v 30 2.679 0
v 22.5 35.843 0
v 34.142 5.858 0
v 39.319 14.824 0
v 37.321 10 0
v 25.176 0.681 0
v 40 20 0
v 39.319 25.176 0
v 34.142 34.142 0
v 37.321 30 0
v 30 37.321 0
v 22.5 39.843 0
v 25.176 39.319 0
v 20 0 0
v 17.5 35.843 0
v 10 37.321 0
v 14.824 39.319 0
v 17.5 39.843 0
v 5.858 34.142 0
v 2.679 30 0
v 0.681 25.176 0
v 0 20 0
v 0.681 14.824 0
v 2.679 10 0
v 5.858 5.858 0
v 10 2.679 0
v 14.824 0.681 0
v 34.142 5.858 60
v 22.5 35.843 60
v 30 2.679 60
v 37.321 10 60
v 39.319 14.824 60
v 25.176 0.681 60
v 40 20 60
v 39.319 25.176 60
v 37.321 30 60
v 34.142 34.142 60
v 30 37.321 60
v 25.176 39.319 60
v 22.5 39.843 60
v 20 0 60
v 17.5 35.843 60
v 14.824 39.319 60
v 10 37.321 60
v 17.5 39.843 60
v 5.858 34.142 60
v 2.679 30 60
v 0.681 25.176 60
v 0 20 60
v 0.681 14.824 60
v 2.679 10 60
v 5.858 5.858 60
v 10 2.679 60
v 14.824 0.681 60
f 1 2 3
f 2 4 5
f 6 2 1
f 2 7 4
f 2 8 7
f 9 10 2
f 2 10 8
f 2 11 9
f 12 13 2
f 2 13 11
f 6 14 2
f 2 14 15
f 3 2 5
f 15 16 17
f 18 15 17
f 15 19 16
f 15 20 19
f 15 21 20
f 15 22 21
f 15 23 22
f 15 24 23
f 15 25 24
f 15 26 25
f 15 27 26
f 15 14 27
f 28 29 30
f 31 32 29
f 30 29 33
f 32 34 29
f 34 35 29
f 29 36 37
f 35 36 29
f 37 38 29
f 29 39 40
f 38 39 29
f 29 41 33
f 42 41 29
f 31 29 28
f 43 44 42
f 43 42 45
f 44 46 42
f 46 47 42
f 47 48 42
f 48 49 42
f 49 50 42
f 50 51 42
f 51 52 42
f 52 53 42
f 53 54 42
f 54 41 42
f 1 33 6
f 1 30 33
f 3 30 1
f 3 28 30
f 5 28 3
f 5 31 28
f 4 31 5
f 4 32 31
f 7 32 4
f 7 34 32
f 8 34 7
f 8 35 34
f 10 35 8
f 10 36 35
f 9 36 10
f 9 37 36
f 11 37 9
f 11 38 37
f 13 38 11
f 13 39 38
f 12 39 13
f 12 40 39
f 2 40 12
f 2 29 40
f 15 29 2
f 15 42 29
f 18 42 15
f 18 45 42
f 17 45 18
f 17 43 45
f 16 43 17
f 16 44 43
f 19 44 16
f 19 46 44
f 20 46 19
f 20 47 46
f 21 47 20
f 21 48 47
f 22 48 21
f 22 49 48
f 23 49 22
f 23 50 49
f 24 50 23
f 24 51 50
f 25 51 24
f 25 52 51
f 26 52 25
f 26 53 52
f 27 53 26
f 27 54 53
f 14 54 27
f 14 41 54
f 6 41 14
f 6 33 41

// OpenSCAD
$fn = 32;

// ----------------------------------------------------------------------
// Keyway shaft: d40 shaft, key 5 x 4 mm
// ----------------------------------------------------------------------

// --- parameters (mm) ---
shaft_r = 20;             // shaft radius
key_w = 5;                // keyway width
key_d = 4;                // keyway depth below the surface line
plate_t = 60;             // shaft length, Z (extrusion height)

shaft_d = 2 * shaft_r;  // shaft diameter
circle_step = 15;  // polygon sampling step, degrees

profile = [[14.824, 39.319], [10, 37.321], [5.858, 34.142], [2.679, 30], [0.681, 25.176], [0, 20], [0.681, 14.824], [2.679, 10], [5.858, 5.858], [10, 2.679], [14.824, 0.681], [20, 0], [25.176, 0.681], [30, 2.679], [34.142, 5.858], [37.321, 10], [39.319, 14.824], [40, 20], [39.319, 25.176], [37.321, 30], [34.142, 34.142], [30, 37.321], [25.176, 39.319], [22.5, 39.843], [22.5, 35.843], [17.5, 35.843], [17.5, 39.843]];  // primary outline, 27 points, counter clockwise

// --- the one profile operation ---
linear_extrude(height = plate_t) polygon(points = profile);
